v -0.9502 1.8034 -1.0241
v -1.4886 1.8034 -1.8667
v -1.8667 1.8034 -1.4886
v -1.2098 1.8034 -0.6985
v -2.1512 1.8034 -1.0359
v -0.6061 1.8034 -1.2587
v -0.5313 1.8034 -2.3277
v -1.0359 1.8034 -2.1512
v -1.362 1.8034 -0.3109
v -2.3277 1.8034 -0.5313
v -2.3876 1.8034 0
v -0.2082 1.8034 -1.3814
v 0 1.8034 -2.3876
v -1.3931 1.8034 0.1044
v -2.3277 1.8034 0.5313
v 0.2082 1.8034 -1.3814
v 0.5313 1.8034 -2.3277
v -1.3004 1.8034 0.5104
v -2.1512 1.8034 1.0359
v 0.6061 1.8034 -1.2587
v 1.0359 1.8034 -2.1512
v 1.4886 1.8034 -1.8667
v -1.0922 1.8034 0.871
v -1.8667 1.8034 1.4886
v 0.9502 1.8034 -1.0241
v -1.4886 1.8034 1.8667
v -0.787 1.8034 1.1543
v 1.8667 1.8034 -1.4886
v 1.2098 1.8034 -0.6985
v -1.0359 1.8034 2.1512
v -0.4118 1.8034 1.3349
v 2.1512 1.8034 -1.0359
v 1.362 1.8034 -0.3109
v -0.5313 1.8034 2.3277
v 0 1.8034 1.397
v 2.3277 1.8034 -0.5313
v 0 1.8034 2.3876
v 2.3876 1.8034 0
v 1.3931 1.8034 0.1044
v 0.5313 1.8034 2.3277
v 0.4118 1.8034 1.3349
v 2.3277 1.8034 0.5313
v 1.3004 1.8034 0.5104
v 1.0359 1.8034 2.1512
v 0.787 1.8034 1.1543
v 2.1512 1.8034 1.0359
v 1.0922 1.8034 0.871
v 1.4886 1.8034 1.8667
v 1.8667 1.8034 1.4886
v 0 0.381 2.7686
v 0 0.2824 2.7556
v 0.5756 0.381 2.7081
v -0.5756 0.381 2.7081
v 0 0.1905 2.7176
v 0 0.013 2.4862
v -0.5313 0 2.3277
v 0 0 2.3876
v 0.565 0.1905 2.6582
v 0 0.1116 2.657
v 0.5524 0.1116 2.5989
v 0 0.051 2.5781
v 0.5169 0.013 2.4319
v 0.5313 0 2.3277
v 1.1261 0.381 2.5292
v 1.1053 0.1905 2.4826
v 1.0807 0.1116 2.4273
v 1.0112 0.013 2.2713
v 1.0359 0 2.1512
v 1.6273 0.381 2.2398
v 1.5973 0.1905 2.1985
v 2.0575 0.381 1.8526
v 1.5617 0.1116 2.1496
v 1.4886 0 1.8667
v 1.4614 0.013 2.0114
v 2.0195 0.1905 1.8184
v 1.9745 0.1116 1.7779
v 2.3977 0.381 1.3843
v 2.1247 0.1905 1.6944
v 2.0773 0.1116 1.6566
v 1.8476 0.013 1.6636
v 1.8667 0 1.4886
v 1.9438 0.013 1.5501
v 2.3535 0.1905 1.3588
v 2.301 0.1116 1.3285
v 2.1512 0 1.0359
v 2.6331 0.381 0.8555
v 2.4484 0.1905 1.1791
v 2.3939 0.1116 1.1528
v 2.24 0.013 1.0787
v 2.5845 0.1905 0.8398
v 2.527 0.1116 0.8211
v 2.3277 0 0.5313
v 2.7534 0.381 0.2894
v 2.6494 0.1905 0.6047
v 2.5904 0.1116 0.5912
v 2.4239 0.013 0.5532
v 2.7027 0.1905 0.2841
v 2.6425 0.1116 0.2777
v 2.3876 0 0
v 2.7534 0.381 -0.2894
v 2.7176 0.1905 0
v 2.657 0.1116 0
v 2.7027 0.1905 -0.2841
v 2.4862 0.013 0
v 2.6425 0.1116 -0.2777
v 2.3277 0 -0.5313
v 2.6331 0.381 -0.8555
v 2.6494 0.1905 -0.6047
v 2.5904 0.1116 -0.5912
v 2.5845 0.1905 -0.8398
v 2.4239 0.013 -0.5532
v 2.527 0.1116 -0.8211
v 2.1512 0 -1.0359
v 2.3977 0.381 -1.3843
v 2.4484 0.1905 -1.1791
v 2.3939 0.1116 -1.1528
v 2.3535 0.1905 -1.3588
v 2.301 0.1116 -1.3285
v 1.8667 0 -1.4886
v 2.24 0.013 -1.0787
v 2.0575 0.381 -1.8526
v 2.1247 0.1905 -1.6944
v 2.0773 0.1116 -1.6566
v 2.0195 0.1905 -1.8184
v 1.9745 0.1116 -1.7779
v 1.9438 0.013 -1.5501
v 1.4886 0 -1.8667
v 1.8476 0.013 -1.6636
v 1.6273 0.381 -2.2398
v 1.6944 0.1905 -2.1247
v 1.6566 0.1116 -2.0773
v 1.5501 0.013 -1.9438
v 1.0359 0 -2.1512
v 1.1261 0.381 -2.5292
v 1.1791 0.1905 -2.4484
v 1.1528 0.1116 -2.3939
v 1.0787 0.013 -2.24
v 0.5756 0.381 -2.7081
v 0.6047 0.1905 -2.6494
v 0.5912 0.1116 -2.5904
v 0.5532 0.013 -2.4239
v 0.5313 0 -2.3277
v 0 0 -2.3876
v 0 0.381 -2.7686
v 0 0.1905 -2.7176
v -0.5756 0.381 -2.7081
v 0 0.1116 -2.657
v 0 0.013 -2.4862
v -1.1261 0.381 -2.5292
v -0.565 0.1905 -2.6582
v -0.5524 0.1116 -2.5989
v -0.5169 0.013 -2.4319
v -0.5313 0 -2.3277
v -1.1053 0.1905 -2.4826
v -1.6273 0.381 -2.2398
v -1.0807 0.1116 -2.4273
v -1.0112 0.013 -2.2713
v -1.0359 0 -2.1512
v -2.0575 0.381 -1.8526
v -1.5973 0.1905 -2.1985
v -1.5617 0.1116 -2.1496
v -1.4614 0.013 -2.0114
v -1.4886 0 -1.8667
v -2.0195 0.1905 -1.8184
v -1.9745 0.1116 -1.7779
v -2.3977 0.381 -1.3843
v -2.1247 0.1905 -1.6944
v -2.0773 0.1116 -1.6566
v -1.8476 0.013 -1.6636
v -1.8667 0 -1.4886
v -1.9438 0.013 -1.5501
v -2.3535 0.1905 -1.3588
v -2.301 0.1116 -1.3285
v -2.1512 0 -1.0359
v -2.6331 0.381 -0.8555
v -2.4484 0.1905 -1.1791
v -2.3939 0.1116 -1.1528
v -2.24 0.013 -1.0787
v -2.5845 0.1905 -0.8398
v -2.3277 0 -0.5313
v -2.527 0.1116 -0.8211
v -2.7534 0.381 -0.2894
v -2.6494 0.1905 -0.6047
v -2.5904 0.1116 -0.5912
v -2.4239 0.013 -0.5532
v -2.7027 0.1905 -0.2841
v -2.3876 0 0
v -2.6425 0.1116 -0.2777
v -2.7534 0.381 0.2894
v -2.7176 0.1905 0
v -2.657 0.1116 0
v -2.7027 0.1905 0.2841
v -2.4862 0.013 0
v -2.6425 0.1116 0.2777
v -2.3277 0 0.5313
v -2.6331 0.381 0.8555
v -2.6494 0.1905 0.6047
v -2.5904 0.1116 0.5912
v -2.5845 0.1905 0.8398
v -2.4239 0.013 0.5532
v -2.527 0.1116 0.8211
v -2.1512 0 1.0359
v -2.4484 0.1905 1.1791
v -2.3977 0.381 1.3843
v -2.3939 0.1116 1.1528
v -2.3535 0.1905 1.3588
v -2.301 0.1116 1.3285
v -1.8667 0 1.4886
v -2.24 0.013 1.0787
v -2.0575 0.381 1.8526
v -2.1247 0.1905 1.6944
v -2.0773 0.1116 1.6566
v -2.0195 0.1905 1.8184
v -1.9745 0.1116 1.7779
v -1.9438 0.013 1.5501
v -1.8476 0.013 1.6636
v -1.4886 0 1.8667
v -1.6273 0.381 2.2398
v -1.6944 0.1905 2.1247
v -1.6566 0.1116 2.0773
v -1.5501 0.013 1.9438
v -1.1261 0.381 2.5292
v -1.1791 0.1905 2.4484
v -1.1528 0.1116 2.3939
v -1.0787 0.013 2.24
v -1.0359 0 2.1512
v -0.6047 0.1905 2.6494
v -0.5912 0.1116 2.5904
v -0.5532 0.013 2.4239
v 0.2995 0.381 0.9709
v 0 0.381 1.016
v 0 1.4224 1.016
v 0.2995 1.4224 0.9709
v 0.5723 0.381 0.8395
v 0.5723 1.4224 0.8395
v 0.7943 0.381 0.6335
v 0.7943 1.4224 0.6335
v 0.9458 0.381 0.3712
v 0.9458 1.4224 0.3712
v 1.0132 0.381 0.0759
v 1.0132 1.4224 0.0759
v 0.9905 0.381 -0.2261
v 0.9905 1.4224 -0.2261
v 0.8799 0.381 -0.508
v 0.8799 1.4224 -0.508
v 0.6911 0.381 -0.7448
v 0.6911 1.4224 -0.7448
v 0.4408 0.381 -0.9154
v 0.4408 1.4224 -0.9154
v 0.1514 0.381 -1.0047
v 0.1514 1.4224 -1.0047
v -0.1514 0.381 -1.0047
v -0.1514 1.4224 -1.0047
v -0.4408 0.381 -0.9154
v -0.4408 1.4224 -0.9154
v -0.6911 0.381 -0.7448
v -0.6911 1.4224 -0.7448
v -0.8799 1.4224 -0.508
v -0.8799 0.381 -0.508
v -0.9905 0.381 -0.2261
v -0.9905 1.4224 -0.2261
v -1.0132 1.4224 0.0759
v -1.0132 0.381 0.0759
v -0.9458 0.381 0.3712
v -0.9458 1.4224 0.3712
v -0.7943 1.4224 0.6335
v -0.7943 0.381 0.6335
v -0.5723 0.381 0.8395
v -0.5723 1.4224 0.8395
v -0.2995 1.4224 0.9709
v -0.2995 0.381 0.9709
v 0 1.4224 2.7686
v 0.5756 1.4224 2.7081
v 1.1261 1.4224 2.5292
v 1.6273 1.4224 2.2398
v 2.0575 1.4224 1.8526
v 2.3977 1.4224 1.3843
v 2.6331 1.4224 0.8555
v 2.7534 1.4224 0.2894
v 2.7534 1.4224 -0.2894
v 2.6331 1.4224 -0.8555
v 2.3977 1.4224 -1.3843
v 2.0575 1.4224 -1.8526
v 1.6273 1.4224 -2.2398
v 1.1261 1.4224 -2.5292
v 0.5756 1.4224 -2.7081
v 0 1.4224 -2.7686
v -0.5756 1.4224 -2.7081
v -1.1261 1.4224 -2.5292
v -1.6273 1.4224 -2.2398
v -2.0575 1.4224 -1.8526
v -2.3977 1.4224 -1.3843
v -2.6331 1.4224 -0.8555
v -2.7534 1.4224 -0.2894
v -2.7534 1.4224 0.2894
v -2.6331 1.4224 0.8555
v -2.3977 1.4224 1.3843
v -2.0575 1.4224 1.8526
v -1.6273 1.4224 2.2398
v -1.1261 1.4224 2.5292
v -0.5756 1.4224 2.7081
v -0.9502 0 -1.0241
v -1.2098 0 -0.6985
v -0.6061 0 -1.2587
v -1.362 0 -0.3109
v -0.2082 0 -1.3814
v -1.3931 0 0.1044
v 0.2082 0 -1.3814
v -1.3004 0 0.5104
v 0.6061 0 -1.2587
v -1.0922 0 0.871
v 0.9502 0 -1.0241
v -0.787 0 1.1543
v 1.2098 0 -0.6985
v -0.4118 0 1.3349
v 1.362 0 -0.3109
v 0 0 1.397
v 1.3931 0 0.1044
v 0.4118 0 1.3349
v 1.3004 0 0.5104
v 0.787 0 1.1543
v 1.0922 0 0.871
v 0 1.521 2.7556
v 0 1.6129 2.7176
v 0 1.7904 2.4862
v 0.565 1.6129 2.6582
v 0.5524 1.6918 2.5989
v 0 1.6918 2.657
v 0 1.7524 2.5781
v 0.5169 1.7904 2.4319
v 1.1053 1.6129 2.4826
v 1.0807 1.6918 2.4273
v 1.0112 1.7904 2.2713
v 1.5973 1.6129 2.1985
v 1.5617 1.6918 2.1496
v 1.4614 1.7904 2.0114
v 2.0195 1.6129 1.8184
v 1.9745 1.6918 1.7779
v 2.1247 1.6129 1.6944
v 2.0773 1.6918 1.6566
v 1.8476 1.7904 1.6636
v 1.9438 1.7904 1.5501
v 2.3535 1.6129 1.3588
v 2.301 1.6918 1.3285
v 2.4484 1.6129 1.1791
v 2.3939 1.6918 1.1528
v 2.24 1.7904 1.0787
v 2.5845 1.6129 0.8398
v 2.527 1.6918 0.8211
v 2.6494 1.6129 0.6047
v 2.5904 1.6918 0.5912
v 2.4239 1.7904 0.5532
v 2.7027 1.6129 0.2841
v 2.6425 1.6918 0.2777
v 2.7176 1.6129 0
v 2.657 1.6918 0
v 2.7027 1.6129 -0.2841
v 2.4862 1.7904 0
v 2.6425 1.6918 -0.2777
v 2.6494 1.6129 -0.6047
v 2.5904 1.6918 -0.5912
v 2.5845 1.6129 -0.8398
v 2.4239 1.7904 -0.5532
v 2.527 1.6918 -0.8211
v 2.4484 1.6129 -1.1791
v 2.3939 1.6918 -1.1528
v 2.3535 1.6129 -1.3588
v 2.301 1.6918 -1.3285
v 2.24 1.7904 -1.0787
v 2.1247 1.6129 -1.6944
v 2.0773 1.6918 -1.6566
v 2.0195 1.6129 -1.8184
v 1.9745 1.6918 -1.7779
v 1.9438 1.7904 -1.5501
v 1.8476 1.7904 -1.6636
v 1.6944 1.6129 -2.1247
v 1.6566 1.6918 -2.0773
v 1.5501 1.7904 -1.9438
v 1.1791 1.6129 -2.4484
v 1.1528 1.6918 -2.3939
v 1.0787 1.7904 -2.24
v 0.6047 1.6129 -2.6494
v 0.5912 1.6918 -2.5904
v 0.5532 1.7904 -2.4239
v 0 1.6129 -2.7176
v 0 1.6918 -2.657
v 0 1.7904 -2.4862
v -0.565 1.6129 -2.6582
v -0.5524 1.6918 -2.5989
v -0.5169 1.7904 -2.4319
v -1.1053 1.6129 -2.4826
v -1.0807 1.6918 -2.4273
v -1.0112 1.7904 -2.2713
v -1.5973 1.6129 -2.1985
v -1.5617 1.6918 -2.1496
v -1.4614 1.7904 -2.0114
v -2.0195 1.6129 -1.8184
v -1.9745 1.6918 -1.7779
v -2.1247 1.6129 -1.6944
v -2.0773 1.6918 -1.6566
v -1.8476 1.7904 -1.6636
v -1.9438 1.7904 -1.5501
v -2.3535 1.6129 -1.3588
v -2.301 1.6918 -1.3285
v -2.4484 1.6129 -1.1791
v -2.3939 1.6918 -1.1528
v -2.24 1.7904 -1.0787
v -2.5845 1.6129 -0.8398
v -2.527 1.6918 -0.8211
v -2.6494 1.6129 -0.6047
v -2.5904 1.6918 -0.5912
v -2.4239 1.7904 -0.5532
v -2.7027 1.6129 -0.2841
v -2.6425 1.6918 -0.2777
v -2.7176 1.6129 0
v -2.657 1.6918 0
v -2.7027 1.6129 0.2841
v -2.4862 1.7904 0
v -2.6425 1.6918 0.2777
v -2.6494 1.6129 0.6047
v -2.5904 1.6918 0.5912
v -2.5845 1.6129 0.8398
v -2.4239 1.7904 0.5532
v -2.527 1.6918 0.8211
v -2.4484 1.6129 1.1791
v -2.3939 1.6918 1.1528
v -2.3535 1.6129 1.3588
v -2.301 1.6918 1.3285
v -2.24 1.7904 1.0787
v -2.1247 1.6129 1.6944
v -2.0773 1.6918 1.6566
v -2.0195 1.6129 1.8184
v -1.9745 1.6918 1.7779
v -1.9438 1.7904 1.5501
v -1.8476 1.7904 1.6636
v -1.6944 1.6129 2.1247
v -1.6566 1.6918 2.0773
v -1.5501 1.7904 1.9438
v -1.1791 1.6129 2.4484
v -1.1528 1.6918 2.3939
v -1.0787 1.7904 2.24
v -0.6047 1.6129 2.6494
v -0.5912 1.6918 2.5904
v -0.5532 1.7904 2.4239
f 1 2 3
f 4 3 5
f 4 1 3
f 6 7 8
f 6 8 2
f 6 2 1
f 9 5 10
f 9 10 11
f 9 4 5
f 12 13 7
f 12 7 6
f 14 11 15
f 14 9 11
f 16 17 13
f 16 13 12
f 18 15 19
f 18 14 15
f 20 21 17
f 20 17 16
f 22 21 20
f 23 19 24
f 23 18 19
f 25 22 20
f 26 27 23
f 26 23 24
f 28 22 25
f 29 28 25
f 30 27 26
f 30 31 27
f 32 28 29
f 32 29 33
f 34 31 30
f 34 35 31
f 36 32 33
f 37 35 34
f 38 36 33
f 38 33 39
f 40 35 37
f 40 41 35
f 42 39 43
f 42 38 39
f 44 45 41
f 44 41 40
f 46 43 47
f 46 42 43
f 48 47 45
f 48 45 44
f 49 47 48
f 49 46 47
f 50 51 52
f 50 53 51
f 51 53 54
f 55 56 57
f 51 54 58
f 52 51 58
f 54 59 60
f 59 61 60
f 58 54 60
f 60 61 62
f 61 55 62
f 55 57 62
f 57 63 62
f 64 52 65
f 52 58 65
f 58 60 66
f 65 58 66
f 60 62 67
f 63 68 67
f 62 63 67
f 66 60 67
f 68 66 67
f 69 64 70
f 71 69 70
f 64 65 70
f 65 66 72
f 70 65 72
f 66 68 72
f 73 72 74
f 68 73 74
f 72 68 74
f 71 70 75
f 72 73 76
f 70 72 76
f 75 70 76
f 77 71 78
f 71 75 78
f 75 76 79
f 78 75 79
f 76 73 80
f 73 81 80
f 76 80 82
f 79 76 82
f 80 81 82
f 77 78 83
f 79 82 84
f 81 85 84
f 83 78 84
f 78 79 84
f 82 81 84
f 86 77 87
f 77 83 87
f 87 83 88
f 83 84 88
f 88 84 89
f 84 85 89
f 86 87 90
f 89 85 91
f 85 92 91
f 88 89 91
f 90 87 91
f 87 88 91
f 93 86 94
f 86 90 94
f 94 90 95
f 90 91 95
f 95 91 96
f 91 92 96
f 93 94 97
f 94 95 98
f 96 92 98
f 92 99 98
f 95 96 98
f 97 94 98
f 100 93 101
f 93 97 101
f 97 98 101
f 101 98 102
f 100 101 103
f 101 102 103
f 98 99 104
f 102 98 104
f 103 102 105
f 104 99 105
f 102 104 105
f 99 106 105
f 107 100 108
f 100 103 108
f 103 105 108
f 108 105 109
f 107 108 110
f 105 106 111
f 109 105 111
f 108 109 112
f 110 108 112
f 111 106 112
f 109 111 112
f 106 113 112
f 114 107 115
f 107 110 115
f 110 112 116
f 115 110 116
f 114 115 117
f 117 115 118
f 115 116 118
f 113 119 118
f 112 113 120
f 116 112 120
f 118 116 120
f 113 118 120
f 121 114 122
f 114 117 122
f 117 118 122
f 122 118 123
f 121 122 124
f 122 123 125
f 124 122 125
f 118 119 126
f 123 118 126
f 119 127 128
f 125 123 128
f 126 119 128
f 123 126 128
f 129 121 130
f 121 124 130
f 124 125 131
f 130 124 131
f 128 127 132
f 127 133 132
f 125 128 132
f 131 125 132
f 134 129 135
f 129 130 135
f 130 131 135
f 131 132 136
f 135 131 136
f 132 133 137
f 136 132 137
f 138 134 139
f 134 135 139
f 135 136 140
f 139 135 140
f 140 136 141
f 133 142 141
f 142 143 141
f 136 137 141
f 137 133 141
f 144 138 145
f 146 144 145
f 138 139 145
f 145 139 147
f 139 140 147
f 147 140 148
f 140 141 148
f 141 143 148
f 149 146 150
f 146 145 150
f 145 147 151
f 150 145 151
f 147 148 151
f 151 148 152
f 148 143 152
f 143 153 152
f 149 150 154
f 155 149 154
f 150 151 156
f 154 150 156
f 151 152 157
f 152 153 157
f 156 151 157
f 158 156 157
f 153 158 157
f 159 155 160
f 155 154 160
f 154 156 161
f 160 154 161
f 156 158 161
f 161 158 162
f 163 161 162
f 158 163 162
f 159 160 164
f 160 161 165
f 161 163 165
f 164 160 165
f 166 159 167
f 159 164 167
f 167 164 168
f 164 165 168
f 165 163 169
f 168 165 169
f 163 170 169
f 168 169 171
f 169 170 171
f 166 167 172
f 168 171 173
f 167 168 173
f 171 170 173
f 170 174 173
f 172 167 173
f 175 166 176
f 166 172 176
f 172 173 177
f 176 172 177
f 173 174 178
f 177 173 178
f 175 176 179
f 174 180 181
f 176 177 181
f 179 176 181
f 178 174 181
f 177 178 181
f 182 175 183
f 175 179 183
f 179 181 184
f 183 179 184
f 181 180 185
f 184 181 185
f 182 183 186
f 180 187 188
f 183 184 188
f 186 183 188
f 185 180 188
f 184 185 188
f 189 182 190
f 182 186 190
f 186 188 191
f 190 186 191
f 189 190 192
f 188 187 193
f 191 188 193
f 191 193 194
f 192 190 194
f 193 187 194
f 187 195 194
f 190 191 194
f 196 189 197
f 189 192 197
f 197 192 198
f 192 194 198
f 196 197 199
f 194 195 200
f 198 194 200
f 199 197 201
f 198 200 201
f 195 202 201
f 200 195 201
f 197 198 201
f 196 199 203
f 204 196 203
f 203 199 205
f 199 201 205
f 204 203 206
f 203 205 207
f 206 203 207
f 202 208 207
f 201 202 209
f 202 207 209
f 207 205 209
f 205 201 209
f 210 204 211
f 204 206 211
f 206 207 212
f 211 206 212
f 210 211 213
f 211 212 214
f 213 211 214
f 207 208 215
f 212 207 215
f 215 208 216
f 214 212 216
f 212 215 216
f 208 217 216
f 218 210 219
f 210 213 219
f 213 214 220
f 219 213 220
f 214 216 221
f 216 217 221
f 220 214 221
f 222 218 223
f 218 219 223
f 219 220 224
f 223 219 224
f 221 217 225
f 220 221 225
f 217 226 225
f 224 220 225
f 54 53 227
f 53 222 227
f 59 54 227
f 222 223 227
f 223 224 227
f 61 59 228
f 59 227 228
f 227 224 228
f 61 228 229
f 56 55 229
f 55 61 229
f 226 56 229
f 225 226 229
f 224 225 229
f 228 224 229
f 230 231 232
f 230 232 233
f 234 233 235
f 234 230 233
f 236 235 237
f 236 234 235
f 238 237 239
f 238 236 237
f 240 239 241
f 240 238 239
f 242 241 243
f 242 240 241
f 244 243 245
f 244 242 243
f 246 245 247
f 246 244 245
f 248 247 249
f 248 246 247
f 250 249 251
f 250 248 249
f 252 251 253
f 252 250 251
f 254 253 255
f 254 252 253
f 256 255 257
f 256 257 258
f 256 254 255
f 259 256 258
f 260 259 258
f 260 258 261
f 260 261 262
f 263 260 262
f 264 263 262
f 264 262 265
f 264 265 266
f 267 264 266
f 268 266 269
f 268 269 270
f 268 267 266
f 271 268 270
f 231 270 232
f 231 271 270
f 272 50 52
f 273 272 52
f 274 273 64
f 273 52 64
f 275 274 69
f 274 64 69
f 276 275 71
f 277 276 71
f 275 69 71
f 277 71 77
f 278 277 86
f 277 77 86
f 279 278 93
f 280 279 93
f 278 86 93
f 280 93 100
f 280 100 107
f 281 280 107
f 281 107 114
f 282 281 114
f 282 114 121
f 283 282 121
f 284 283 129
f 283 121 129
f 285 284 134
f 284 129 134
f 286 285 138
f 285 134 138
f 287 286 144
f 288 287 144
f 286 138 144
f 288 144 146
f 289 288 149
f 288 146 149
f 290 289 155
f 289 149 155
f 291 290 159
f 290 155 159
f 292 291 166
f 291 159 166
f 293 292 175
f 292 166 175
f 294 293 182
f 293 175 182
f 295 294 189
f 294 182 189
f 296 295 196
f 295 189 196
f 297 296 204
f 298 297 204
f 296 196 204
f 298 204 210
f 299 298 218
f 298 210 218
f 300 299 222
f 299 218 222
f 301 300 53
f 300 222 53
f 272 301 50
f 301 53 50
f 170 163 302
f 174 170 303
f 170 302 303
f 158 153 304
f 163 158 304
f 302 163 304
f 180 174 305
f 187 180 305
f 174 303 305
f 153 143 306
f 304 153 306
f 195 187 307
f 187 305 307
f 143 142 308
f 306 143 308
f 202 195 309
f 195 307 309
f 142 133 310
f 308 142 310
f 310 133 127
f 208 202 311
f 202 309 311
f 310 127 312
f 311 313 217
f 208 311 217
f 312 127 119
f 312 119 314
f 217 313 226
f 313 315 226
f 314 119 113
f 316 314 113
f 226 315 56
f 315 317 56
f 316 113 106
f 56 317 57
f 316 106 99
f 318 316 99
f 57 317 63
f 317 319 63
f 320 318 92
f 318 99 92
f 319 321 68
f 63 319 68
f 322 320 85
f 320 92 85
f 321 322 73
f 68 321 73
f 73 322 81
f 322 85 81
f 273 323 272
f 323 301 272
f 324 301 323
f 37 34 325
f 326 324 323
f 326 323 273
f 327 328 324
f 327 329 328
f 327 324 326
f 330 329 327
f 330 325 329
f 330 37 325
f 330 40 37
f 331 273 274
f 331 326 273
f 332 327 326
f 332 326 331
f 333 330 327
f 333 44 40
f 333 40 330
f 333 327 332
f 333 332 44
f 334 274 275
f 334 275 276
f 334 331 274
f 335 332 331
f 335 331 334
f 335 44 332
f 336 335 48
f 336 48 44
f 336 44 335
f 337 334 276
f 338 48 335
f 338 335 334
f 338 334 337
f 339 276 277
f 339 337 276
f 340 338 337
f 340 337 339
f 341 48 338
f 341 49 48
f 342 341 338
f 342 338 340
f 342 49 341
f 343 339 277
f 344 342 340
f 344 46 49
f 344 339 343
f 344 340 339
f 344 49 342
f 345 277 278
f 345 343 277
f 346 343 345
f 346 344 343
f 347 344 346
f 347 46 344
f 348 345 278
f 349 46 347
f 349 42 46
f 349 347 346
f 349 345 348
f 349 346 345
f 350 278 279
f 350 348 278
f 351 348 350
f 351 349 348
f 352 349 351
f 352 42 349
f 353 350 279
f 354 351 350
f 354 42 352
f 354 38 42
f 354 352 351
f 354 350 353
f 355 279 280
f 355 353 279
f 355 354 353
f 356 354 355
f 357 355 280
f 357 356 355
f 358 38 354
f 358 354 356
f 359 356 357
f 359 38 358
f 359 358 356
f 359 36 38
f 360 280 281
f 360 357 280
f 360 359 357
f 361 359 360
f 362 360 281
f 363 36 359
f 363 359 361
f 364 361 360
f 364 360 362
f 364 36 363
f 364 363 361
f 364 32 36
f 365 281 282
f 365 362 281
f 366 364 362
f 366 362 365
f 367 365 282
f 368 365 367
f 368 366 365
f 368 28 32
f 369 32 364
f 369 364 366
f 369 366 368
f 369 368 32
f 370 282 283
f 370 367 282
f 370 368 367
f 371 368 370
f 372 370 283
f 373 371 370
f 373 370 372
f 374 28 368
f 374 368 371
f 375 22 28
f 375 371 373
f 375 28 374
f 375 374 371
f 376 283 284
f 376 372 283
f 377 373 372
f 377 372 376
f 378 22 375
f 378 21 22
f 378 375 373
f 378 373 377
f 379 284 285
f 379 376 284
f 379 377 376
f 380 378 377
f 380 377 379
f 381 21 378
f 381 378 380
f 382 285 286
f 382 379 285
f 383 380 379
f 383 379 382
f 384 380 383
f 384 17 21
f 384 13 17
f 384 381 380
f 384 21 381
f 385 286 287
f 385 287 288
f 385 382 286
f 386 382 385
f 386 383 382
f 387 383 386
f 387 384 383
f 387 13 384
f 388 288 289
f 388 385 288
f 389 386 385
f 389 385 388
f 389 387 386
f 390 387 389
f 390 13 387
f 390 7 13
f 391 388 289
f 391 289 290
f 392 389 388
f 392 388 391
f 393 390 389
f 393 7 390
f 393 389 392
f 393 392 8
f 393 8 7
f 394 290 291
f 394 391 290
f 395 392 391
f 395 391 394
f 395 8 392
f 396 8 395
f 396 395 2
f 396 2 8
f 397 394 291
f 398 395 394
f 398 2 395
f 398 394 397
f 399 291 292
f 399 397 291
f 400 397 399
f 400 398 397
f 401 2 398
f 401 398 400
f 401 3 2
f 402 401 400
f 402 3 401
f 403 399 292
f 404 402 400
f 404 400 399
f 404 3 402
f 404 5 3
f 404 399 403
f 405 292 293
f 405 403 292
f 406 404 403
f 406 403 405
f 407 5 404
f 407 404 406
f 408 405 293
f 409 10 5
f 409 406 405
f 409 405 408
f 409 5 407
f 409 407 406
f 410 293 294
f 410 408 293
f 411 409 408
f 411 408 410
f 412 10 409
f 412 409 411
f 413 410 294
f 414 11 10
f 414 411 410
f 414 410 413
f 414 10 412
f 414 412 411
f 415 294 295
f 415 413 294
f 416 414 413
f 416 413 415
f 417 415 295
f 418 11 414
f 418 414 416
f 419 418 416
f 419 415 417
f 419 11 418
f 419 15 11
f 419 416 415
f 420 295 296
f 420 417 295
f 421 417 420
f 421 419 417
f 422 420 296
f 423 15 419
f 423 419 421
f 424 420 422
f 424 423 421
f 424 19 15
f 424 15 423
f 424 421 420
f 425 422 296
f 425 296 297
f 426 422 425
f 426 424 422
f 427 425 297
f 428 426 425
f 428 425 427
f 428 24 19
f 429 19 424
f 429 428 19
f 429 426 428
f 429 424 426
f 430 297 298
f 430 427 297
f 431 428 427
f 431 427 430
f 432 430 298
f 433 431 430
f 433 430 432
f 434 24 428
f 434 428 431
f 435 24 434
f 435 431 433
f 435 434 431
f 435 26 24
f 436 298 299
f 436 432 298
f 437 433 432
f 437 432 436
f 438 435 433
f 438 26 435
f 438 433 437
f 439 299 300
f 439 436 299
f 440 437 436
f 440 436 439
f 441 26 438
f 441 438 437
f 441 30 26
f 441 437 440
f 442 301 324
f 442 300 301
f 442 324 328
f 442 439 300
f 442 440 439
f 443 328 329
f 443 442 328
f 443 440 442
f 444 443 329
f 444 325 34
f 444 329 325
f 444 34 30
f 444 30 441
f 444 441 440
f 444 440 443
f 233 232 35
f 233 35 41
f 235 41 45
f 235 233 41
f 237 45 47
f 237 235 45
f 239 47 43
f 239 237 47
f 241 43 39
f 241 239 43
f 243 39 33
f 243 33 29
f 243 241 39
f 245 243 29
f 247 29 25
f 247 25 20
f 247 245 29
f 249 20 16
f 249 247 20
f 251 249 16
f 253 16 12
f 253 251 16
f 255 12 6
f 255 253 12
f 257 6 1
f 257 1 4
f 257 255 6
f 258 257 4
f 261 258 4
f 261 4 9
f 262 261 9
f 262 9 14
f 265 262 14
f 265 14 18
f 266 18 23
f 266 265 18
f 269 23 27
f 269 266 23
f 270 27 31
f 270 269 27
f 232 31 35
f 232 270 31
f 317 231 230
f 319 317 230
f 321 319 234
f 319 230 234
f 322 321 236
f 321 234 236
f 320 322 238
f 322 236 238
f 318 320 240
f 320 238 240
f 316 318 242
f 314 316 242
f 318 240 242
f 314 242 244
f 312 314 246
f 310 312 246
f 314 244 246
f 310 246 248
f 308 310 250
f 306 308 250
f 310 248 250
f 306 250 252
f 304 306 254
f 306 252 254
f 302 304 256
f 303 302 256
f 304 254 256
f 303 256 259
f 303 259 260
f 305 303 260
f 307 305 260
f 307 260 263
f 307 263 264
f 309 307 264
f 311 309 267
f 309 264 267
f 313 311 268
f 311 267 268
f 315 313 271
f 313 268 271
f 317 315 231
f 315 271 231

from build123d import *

# Parameters (mm, degrees)
SKETCH1_R           = 2.7686
SKETCH1_R_2         = 1.016
BOSS_EXTRUDE1_DEPTH = 1.8034
FILLET1_R           = 0.381
CHAMFER1_SIZE       = 0.381


with BuildPart() as part:
    # Sketch1 → Boss-Extrude1 (new body)
    with BuildSketch(Plane(origin=(0, 0, 0), x_dir=(1, 0, 0), z_dir=(0, 1, 0))):
        with Locations(Location((0, 0, 0), (0, 0, 270))):
            Circle(SKETCH1_R)
        with Locations(Location((0, 0, 0), (0, 0, 270))):
            Circle(SKETCH1_R_2, mode=Mode.SUBTRACT)
    extrude(amount=BOSS_EXTRUDE1_DEPTH)

    # Fillet1
    fillet1_edges = [part.edges().sort_by_distance(p)[0] for p in [
        (0, 0, -2.7686),
        (0, 1.8034, -2.7686),
    ]]
    fillet(fillet1_edges, radius=FILLET1_R)

    # Chamfer1
    chamfer1_edges = [part.edges().sort_by_distance(p)[0] for p in [
        (0, 0, -1.016),
        (0, 1.8034, -1.016),
    ]]
    chamfer(chamfer1_edges, length=CHAMFER1_SIZE)


solid = part.part
